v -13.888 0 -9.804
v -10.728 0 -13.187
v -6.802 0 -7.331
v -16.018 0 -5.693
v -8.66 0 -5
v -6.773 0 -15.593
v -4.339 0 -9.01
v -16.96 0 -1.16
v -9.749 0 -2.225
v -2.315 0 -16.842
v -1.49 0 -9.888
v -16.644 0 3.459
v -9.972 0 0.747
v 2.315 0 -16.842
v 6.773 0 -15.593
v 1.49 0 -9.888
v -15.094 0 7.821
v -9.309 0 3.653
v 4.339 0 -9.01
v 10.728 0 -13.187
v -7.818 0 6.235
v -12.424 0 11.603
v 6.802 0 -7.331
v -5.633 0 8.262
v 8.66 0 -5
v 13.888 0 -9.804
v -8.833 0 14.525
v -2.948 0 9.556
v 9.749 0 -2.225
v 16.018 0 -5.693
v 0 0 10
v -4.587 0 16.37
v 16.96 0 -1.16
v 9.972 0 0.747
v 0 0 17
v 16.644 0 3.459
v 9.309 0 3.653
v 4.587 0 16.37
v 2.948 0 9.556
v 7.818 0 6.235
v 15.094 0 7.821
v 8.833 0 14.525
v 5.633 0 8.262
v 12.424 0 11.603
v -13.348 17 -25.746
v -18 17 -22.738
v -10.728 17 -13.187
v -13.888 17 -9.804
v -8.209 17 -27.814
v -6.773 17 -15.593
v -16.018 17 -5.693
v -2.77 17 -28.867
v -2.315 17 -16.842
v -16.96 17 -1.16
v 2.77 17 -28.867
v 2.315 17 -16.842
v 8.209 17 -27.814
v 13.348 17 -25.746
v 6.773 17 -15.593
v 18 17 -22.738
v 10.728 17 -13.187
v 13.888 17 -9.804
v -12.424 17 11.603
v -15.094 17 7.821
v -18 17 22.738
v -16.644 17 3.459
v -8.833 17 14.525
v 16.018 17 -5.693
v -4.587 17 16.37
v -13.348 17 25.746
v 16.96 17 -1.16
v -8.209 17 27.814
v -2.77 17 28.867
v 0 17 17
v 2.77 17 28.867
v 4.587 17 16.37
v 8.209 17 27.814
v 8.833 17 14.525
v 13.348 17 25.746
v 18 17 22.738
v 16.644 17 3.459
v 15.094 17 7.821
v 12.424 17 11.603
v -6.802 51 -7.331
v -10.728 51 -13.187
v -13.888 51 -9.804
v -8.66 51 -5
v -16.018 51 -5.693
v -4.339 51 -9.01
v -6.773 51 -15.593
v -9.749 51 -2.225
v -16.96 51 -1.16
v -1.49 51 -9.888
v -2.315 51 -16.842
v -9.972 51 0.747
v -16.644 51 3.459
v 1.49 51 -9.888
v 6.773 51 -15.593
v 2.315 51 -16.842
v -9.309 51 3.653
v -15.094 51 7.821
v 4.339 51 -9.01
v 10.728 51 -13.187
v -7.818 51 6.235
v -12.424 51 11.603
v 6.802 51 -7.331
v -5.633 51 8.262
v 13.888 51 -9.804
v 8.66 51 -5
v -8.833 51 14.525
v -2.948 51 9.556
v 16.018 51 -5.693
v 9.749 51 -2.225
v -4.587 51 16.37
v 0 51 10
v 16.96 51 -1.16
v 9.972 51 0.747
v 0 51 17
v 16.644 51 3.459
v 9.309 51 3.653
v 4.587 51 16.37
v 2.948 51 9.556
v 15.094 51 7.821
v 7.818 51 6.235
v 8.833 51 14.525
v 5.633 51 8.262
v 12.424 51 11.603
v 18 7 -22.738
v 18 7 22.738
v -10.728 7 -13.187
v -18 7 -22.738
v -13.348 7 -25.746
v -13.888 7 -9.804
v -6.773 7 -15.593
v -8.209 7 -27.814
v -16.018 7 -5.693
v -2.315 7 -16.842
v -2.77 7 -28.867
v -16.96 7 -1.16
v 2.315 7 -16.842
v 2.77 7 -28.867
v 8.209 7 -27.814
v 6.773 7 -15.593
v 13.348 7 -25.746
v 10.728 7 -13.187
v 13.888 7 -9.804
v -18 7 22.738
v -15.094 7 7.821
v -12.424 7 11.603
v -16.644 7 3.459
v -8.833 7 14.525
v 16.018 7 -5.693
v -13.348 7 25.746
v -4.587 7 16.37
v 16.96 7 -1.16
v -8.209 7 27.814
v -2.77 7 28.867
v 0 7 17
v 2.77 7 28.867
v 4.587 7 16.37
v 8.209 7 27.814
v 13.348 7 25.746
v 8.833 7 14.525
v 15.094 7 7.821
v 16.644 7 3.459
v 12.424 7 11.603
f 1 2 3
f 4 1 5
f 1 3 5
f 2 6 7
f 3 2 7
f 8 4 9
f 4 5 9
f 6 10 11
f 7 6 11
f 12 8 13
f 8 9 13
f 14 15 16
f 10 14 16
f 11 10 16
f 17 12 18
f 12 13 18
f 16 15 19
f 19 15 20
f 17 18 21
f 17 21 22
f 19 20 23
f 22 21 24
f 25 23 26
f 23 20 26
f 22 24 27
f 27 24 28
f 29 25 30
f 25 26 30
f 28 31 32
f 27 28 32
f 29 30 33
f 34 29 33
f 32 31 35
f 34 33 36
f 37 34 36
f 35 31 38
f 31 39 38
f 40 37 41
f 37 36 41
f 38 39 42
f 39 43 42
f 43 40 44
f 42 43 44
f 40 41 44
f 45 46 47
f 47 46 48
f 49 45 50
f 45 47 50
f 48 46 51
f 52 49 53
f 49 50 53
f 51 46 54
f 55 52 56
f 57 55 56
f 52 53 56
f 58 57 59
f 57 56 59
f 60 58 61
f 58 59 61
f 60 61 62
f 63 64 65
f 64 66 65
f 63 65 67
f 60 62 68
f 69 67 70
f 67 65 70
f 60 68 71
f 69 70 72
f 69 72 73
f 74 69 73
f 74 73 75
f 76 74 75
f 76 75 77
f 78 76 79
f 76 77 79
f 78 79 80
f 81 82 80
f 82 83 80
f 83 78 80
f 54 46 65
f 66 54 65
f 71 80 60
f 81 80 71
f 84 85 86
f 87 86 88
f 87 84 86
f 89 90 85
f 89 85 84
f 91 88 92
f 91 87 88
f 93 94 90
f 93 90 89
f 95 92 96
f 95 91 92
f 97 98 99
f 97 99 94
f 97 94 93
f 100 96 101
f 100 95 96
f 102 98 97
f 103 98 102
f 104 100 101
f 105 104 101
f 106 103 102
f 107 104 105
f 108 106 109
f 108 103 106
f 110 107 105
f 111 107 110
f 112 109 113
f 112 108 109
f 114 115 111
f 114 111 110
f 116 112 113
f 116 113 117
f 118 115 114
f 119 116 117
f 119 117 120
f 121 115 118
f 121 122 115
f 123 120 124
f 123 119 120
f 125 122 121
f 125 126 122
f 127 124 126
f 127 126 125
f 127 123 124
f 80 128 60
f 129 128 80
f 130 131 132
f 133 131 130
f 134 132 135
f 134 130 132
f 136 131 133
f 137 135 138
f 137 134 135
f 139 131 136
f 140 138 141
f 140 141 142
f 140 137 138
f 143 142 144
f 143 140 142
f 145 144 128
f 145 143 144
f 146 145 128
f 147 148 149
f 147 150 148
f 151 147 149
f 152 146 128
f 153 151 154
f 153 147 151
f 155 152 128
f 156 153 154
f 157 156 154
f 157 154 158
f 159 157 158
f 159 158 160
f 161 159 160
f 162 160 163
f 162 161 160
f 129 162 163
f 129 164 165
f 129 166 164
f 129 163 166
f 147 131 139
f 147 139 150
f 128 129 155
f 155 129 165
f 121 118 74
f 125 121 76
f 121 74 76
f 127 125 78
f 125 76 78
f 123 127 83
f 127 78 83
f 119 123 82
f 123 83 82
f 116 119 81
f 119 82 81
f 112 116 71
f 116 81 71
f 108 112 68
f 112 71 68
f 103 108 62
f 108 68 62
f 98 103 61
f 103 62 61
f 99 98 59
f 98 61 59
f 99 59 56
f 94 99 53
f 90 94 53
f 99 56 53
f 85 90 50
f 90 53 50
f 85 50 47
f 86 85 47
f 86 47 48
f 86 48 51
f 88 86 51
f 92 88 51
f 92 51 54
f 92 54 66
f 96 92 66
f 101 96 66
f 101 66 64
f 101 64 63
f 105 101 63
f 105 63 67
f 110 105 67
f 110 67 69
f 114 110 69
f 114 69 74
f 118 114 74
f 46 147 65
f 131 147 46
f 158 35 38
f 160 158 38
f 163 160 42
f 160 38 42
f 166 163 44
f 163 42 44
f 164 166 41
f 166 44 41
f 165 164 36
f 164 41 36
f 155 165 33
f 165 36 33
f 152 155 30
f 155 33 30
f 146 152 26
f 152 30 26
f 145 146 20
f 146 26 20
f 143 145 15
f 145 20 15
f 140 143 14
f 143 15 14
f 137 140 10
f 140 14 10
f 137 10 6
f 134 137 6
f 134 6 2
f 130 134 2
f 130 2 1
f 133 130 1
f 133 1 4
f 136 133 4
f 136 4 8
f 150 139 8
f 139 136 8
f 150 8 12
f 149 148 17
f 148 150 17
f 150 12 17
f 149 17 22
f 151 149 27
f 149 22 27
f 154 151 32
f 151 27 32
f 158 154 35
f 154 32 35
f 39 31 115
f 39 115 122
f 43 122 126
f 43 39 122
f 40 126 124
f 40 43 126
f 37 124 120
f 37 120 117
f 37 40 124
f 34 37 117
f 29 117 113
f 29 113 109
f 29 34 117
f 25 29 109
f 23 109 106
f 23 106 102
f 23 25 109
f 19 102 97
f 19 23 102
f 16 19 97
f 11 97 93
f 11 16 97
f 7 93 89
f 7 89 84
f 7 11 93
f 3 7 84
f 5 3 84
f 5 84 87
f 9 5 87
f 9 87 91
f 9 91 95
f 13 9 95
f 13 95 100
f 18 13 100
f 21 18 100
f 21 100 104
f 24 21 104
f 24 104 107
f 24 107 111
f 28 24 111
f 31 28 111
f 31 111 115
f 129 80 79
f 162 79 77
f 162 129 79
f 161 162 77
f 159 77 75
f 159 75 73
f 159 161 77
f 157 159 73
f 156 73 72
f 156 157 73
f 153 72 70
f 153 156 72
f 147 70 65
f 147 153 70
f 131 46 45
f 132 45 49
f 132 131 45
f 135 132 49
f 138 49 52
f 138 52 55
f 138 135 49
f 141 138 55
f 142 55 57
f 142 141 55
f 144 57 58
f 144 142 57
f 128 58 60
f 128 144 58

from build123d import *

# Parameters (mm, degrees)
SKETCH_1_R      = 17
SKETCH_1_R_2    = 10
EXTRUDE_1_DEPTH = 51
EXTRUDE_START   = -7
SKETCH_7_R      = 10
EXTRUDE_2_DEPTH = 10


with BuildPart() as part:
    # 草图1 → 凸台-拉伸1 (new body)
    with BuildSketch(Plane(origin=(0, 0, 0), x_dir=(1, 0, 0), z_dir=(0, 1, 0))):
        with Locations(Location((0, 0, 0), (0, 0, 270))):
            Circle(SKETCH_1_R)
        with Locations(Location((0, 0, 0), (0, 0, 270))):
            Circle(SKETCH_1_R_2, mode=Mode.SUBTRACT)
    extrude(amount=EXTRUDE_1_DEPTH)

    # 草图7 → 凸台-拉伸2 (add)
    with BuildSketch(Plane.XZ.offset(EXTRUDE_START)):
        with BuildLine():
            Line((-18, 22.737634002), (-18, -22.737634002))
            ThreePointArc((-18, -22.737634002), (0, -29), (18, -22.737634002))
            Line((18, -22.737634002), (18, 22.737634002))
            ThreePointArc((18, 22.737634002), (0, 29), (-18, 22.737634002))
        make_face()
        with Locations(Location((0, 0, 0), (0, 0, 90))):
            Circle(SKETCH_7_R, mode=Mode.SUBTRACT)
    extrude(amount=-EXTRUDE_2_DEPTH)


solid = part.part
